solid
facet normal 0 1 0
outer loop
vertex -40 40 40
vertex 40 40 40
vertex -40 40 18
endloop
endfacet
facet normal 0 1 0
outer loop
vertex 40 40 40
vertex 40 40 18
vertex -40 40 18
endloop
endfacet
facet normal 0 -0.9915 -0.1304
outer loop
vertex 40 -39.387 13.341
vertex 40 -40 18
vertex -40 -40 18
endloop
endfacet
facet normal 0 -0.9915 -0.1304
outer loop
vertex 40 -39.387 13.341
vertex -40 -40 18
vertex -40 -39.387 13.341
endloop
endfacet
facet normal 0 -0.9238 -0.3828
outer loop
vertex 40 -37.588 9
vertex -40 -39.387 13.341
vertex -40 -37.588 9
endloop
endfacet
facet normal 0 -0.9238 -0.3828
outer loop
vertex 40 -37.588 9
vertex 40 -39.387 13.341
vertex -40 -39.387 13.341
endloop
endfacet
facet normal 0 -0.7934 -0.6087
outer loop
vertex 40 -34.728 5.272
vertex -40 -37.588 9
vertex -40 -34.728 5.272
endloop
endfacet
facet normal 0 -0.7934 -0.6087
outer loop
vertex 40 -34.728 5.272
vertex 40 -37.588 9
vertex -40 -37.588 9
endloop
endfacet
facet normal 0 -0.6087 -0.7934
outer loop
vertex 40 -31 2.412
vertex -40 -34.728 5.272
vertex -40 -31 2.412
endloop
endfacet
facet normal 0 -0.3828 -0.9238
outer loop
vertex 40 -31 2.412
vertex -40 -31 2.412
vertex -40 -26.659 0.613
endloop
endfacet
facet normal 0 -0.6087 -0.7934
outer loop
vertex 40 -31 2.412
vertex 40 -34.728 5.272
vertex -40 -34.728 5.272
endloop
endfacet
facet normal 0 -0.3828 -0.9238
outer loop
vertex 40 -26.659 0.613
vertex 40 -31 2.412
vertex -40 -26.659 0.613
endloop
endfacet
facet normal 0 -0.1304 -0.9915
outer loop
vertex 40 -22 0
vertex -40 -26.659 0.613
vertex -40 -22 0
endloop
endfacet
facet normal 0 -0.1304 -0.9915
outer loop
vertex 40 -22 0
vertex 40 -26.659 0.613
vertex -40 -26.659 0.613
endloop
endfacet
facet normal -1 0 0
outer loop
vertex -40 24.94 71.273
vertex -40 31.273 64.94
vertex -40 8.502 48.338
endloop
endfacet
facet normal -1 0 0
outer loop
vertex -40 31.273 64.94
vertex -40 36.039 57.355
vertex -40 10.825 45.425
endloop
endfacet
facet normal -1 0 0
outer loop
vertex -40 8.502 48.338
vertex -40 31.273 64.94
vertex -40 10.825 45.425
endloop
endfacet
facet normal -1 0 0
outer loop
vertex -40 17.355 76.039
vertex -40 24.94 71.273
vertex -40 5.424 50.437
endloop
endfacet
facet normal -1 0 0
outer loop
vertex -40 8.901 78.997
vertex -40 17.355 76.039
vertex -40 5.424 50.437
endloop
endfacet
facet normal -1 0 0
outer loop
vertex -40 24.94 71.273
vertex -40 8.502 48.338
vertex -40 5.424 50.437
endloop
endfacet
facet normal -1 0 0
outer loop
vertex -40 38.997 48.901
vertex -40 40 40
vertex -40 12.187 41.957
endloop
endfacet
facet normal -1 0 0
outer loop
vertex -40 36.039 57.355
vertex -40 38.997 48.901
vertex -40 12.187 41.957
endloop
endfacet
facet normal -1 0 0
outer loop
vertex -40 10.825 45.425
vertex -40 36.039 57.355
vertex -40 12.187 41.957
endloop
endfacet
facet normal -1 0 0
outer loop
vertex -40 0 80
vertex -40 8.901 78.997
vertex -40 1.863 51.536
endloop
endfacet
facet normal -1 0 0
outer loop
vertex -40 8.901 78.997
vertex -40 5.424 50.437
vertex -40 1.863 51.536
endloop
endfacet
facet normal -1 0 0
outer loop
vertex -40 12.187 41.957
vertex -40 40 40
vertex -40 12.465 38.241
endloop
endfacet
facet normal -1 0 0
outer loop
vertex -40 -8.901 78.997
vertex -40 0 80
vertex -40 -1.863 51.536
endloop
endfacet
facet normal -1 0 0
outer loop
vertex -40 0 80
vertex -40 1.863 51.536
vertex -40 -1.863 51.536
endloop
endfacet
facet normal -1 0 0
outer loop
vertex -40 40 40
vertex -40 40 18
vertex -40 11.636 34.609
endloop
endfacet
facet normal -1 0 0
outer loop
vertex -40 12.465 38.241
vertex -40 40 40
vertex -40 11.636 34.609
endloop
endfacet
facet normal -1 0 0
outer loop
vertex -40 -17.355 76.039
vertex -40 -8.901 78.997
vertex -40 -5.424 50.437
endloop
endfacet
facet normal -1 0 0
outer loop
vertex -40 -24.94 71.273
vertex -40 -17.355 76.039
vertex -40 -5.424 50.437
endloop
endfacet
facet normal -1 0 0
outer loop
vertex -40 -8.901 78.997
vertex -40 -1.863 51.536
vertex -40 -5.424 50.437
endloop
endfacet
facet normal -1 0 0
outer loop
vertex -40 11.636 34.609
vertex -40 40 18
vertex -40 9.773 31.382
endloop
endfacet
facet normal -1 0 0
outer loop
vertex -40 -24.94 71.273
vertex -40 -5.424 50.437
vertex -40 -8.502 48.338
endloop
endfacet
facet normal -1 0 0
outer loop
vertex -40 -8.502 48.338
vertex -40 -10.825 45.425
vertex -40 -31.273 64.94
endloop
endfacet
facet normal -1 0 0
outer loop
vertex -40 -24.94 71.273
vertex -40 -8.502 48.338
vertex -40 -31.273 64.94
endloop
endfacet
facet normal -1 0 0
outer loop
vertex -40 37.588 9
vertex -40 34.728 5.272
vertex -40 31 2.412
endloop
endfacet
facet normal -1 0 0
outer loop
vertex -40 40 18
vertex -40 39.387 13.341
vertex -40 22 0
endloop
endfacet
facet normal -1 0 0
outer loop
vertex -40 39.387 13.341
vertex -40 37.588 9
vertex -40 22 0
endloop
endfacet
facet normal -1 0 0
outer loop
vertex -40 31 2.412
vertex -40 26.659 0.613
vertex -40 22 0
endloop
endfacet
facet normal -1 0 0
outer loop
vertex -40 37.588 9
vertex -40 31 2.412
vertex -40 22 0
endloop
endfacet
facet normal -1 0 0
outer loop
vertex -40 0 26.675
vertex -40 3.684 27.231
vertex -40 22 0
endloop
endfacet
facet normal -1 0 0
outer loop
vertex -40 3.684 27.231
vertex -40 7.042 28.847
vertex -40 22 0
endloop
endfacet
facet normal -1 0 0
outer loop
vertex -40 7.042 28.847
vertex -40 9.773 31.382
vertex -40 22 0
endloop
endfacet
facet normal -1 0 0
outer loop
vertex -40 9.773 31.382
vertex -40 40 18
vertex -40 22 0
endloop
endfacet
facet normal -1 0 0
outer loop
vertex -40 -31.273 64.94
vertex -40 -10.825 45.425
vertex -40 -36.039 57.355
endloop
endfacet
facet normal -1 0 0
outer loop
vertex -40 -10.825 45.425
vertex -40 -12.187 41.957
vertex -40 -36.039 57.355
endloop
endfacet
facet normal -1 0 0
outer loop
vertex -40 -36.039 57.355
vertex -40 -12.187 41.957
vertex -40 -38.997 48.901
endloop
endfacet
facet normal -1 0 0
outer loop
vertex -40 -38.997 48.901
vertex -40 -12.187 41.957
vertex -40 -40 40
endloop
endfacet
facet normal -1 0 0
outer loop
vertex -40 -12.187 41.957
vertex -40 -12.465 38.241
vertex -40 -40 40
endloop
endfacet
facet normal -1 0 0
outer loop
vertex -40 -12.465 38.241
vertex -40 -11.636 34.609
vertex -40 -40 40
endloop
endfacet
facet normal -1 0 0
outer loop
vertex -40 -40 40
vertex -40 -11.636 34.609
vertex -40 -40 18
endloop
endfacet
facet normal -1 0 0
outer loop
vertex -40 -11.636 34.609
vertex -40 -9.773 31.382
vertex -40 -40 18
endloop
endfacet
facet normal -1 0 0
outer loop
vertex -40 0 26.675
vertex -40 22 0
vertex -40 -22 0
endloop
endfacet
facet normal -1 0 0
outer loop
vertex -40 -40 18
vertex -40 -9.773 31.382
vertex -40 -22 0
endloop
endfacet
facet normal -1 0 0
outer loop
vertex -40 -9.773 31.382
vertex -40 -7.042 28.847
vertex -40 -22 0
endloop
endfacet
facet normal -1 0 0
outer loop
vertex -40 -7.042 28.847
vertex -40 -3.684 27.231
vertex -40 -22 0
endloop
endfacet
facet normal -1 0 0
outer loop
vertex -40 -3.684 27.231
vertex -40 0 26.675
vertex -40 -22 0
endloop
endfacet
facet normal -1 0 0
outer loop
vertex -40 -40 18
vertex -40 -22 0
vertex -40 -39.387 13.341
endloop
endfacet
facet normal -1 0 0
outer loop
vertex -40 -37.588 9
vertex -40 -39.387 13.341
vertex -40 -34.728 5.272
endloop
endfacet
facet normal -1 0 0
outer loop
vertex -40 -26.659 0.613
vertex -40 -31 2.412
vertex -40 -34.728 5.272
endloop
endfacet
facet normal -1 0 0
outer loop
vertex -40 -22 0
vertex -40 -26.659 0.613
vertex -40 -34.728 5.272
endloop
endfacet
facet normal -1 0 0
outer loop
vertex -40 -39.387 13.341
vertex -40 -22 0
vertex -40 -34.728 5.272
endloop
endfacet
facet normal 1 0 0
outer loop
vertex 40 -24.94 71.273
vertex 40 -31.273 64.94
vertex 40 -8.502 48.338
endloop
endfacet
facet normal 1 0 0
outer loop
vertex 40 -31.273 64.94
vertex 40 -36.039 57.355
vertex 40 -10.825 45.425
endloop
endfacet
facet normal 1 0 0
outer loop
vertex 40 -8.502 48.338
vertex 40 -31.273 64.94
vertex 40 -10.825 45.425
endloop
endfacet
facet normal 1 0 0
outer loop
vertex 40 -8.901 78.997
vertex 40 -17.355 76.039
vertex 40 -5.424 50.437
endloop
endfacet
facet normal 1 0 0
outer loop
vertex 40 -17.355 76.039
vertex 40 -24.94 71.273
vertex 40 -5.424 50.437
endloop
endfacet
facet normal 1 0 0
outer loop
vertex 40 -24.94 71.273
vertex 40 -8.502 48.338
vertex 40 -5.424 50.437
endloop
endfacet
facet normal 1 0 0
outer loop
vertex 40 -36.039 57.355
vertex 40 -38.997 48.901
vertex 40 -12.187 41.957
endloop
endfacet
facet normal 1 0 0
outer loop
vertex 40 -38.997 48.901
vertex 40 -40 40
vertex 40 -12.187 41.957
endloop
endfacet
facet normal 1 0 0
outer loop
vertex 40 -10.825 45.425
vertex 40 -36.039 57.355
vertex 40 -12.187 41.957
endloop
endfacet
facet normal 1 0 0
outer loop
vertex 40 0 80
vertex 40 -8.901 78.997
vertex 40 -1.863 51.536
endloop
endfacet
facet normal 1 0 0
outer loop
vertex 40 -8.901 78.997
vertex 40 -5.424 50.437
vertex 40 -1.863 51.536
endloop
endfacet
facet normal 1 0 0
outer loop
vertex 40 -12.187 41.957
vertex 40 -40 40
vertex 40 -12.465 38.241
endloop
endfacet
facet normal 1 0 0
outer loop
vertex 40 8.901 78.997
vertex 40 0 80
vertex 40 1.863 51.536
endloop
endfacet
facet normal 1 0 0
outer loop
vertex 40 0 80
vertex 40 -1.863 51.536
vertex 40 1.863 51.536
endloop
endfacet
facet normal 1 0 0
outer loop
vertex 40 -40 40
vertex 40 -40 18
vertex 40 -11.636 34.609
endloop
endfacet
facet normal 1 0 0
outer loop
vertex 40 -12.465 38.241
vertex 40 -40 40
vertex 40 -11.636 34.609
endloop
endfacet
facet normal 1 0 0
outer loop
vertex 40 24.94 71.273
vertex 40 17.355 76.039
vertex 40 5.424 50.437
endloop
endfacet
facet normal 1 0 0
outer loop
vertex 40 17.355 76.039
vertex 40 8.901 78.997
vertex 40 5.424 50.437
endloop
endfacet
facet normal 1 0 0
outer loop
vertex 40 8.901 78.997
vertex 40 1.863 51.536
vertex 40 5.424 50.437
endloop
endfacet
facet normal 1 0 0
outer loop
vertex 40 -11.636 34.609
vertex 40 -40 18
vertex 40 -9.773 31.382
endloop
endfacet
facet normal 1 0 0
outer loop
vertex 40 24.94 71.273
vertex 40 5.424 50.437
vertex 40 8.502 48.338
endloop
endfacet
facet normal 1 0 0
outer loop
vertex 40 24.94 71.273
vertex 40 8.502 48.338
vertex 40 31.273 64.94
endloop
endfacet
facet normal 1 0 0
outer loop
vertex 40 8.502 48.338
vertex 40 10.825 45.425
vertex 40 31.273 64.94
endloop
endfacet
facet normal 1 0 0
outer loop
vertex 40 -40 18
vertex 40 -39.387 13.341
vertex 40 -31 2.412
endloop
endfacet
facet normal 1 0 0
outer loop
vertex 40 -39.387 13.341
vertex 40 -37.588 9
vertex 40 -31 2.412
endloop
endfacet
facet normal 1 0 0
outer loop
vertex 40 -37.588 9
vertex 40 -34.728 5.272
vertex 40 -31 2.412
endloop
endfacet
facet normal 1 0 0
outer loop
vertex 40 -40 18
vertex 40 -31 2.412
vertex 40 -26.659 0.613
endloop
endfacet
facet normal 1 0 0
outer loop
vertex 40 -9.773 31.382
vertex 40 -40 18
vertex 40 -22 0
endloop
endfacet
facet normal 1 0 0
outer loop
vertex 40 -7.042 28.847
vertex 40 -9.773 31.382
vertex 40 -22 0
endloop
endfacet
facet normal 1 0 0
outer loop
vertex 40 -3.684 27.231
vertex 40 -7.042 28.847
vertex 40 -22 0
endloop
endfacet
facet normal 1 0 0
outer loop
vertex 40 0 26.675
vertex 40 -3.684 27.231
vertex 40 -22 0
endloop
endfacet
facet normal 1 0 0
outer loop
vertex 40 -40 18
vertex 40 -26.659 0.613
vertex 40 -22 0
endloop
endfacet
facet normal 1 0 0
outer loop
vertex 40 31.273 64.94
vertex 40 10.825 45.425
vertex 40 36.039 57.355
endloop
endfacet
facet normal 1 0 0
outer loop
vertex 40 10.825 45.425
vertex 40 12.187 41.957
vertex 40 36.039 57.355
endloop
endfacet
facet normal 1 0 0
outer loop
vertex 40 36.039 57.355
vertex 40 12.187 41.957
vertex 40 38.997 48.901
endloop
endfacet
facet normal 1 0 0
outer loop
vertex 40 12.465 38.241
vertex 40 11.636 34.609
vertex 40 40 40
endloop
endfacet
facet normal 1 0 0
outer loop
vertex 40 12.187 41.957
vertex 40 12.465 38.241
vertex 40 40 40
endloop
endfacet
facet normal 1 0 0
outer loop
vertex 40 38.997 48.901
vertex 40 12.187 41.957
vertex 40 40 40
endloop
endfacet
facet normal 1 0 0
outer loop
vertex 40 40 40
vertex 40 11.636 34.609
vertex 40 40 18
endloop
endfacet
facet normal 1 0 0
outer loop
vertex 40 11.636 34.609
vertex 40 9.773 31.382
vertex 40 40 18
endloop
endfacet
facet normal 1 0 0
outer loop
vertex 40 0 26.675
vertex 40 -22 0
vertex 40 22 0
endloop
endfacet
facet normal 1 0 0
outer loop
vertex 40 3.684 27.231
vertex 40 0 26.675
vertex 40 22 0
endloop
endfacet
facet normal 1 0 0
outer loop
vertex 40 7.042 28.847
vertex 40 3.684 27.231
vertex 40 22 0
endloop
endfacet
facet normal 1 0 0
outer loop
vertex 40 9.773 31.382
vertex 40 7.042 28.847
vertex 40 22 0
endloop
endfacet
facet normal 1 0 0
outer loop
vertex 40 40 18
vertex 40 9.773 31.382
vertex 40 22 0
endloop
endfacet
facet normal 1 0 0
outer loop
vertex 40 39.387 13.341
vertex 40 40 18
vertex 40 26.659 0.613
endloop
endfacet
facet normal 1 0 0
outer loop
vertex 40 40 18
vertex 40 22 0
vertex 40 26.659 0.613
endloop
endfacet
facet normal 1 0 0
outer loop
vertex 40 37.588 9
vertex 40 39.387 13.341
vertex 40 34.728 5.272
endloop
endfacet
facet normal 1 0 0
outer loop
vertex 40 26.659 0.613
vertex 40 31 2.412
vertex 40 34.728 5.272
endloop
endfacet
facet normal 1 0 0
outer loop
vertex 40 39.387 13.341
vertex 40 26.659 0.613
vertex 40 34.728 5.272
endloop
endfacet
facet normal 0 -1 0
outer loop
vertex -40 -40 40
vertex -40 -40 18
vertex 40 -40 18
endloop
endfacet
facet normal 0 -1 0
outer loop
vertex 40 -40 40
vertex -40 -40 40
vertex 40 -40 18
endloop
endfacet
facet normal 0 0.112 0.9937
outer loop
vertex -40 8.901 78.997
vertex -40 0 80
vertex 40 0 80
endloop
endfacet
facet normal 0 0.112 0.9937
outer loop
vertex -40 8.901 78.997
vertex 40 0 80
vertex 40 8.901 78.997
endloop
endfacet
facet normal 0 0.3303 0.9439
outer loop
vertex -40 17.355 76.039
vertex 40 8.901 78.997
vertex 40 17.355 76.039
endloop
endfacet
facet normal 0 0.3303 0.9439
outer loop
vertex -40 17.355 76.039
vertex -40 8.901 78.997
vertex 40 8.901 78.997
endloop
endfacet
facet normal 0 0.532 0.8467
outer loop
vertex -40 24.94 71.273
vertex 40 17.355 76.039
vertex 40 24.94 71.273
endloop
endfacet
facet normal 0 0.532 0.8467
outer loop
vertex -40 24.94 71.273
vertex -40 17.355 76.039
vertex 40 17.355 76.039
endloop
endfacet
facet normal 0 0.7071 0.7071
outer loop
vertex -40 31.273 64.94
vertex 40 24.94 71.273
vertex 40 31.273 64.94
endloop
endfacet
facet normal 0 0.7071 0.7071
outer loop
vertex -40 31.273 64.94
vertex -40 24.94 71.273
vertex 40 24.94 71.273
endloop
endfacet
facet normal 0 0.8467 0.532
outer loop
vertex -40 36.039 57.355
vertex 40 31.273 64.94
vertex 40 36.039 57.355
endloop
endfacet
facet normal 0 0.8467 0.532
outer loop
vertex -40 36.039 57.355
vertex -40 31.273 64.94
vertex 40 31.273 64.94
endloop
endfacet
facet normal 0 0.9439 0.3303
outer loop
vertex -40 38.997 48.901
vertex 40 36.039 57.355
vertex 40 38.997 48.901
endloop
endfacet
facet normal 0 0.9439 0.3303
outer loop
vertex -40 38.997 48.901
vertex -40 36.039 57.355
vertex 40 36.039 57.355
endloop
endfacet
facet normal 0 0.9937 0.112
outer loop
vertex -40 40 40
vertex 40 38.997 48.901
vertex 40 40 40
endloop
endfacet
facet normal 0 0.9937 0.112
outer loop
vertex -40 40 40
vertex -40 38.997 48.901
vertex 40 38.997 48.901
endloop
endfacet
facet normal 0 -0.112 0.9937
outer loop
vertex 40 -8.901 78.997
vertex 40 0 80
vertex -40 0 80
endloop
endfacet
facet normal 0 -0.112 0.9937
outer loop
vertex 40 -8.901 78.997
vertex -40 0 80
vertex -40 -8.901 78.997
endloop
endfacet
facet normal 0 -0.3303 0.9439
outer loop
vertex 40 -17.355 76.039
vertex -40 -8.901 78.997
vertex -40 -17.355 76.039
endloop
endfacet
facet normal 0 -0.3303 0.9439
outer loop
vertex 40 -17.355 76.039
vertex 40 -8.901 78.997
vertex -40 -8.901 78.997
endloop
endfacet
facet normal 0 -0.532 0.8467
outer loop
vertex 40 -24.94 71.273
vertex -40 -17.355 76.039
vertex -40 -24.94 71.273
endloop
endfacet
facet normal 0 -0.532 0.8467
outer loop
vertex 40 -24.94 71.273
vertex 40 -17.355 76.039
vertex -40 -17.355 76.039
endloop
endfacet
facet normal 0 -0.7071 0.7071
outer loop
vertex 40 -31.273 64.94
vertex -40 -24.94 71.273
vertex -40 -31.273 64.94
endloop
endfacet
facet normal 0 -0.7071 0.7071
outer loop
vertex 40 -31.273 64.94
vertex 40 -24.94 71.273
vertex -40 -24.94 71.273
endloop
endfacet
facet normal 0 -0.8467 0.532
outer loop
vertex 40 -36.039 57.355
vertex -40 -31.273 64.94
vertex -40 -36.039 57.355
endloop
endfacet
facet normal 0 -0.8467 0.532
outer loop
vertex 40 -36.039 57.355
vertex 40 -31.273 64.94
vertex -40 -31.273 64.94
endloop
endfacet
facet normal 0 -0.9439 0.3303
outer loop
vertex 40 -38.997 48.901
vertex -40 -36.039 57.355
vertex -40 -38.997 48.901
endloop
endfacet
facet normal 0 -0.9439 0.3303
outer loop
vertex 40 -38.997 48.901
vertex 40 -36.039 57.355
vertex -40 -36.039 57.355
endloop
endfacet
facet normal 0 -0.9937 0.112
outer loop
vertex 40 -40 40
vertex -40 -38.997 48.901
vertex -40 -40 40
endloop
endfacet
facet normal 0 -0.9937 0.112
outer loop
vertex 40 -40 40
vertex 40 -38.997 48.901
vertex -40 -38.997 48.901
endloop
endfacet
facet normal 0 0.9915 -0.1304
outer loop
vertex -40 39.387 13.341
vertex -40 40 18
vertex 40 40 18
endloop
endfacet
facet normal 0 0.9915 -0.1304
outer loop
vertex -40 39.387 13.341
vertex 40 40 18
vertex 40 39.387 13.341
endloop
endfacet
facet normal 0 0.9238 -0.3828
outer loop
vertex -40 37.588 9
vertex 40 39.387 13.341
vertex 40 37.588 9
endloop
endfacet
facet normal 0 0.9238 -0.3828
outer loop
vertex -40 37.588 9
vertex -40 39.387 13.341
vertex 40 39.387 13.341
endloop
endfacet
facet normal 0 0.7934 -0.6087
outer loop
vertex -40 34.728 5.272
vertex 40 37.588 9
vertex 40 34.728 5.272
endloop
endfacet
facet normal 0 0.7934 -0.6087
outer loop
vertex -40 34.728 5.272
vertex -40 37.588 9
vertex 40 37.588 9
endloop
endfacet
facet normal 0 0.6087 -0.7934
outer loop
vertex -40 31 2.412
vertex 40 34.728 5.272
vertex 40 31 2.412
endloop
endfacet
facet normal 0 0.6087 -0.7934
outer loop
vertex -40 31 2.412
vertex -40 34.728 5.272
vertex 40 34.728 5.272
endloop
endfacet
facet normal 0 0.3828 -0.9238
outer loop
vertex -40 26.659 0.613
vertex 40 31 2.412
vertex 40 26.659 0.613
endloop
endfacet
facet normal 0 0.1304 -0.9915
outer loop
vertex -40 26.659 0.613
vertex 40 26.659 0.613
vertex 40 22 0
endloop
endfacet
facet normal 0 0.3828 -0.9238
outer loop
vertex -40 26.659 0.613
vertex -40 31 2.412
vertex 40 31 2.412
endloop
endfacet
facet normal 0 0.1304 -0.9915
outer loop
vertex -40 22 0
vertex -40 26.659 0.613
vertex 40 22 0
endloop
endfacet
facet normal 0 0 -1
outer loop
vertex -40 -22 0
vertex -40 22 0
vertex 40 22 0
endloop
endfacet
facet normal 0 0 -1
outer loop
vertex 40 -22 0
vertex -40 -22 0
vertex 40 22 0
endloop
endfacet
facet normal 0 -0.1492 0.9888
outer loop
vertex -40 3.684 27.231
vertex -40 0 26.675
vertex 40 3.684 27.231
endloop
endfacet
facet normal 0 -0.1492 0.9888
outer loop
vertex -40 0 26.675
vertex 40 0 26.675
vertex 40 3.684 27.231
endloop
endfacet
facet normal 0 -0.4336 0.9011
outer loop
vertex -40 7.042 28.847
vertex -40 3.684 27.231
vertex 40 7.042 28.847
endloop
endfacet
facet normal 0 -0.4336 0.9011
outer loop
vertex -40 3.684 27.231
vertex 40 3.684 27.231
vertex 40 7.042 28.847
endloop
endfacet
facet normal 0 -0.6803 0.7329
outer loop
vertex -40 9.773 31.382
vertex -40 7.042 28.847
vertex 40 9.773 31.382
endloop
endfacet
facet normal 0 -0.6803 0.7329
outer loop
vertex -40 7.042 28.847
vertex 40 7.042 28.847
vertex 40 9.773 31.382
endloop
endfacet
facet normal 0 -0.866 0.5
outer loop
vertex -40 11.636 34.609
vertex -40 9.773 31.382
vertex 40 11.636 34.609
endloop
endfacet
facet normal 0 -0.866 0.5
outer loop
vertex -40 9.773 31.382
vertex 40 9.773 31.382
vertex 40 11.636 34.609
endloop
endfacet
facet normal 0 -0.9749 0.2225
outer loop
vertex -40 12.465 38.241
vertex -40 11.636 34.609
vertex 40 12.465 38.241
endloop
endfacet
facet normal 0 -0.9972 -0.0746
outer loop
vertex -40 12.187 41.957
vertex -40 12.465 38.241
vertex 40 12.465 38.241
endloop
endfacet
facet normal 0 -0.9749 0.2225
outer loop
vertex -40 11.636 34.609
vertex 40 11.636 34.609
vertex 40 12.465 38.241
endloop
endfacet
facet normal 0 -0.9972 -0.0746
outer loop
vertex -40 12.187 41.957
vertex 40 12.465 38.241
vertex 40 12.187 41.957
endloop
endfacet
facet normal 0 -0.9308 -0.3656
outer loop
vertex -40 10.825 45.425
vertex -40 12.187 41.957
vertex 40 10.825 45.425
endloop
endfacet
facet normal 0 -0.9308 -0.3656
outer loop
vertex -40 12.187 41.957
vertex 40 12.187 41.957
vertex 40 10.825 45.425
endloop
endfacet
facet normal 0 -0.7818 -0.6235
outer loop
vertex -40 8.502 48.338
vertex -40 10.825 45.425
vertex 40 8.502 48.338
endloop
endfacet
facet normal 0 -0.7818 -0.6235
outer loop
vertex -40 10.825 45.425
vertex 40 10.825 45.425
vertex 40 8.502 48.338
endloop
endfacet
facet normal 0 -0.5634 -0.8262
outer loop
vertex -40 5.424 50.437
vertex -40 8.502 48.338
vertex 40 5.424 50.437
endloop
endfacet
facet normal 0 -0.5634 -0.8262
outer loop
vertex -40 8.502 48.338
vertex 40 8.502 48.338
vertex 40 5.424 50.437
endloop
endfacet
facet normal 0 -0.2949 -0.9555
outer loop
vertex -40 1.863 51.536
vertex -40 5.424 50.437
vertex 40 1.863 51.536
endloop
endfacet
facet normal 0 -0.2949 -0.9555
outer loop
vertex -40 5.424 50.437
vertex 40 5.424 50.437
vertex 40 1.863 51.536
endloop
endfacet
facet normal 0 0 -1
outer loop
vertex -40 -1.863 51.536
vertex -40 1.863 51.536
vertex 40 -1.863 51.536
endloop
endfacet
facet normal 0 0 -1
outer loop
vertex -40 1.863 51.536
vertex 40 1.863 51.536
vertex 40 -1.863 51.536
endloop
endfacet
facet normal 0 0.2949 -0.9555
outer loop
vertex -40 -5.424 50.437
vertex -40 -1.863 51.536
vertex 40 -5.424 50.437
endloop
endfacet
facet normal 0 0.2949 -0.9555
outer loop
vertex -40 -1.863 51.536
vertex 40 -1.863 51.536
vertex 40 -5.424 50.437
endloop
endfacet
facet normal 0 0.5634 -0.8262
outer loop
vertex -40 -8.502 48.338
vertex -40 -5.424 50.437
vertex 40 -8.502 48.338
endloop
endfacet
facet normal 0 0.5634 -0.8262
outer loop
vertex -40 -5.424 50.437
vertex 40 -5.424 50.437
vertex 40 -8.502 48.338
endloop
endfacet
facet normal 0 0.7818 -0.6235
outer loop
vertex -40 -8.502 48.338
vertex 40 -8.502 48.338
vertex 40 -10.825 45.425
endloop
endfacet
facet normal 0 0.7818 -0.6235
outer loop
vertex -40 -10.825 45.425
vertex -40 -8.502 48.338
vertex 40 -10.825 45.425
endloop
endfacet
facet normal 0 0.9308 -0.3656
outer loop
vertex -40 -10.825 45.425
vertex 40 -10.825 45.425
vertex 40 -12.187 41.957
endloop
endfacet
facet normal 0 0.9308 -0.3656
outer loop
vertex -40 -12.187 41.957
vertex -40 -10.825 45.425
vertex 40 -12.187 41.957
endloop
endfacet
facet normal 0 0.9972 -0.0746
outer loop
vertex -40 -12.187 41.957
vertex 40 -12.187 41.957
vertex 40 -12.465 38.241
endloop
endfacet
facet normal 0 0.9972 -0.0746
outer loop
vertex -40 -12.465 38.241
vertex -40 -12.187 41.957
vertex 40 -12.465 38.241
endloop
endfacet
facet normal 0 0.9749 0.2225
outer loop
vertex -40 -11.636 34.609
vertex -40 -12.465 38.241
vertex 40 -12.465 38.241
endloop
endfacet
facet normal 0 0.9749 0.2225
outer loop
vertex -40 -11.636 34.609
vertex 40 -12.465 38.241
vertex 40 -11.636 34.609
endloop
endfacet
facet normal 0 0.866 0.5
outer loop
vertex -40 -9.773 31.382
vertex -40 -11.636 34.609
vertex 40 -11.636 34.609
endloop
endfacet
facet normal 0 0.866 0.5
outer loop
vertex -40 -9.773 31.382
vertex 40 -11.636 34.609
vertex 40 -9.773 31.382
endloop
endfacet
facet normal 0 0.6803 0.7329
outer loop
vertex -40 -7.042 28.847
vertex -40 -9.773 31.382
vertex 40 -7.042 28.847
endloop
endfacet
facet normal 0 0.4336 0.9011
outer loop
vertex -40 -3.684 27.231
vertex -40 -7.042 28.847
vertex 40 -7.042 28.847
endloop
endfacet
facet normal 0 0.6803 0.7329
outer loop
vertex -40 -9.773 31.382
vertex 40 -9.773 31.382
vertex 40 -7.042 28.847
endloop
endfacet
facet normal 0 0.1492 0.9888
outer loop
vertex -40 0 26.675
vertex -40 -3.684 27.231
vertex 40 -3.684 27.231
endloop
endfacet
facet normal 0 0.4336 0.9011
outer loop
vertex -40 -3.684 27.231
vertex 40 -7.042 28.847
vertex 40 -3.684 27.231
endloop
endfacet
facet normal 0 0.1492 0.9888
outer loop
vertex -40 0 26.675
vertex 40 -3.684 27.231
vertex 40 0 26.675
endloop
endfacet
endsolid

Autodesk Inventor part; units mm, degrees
ref_plane "YZ Plane" through (0, 0, 0) normal (1, 0, 0) x (0, 1, 0)
ref_plane "XZ Plane" through (0, 0, 0) normal (0, 1, 0) x (-1, 0, 0)
ref_plane "XY Plane" through (0, 0, 0) normal (0, 0, 1) x (1, 0, 0)
sketch "Szkic3" plane through (0, 0, 0) normal (0, 0, 1) x (1, 0, 0)
  line L0 (-40, -40) -> (40, -40)
  line L1 (40, -40) -> (40, 40)
  line L2 (40, 40) -> (-40, 40)
  line L3 (-40, 40) -> (-40, -40)
  line L4 (-40, -40) -> (40, 40) construction
  line L5 (40, -40) -> (-40, 40) construction
  point P0 (0, 0)
  dimension "d8" = 80
  dimension "d9" = 80
extrude "Wyciągnięcie proste3" add sketch "Szkic3" along normal blind 80
fillet "Zaokrąglenie2" radius 18 2 edges at (0, 40, 0) (0, -40, 0)
fillet "Zaokrąglenie3" radius 40 2 edges at (0, 40, 80) (0, -40, 80)
sketch "Szkic4" plane through (40, -22, 0) normal (1, 0, 0) x (0, 0, -1)
  circle A0 centre (-39.1753, 22) radius 12.5
  point P0 (0, 22)
  dimension "d14" = 25
extrude "Wyciągnięcie proste4" cut sketch "Szkic4" against normal through all
properties part number "jakis_modulxD" material "Stal"
